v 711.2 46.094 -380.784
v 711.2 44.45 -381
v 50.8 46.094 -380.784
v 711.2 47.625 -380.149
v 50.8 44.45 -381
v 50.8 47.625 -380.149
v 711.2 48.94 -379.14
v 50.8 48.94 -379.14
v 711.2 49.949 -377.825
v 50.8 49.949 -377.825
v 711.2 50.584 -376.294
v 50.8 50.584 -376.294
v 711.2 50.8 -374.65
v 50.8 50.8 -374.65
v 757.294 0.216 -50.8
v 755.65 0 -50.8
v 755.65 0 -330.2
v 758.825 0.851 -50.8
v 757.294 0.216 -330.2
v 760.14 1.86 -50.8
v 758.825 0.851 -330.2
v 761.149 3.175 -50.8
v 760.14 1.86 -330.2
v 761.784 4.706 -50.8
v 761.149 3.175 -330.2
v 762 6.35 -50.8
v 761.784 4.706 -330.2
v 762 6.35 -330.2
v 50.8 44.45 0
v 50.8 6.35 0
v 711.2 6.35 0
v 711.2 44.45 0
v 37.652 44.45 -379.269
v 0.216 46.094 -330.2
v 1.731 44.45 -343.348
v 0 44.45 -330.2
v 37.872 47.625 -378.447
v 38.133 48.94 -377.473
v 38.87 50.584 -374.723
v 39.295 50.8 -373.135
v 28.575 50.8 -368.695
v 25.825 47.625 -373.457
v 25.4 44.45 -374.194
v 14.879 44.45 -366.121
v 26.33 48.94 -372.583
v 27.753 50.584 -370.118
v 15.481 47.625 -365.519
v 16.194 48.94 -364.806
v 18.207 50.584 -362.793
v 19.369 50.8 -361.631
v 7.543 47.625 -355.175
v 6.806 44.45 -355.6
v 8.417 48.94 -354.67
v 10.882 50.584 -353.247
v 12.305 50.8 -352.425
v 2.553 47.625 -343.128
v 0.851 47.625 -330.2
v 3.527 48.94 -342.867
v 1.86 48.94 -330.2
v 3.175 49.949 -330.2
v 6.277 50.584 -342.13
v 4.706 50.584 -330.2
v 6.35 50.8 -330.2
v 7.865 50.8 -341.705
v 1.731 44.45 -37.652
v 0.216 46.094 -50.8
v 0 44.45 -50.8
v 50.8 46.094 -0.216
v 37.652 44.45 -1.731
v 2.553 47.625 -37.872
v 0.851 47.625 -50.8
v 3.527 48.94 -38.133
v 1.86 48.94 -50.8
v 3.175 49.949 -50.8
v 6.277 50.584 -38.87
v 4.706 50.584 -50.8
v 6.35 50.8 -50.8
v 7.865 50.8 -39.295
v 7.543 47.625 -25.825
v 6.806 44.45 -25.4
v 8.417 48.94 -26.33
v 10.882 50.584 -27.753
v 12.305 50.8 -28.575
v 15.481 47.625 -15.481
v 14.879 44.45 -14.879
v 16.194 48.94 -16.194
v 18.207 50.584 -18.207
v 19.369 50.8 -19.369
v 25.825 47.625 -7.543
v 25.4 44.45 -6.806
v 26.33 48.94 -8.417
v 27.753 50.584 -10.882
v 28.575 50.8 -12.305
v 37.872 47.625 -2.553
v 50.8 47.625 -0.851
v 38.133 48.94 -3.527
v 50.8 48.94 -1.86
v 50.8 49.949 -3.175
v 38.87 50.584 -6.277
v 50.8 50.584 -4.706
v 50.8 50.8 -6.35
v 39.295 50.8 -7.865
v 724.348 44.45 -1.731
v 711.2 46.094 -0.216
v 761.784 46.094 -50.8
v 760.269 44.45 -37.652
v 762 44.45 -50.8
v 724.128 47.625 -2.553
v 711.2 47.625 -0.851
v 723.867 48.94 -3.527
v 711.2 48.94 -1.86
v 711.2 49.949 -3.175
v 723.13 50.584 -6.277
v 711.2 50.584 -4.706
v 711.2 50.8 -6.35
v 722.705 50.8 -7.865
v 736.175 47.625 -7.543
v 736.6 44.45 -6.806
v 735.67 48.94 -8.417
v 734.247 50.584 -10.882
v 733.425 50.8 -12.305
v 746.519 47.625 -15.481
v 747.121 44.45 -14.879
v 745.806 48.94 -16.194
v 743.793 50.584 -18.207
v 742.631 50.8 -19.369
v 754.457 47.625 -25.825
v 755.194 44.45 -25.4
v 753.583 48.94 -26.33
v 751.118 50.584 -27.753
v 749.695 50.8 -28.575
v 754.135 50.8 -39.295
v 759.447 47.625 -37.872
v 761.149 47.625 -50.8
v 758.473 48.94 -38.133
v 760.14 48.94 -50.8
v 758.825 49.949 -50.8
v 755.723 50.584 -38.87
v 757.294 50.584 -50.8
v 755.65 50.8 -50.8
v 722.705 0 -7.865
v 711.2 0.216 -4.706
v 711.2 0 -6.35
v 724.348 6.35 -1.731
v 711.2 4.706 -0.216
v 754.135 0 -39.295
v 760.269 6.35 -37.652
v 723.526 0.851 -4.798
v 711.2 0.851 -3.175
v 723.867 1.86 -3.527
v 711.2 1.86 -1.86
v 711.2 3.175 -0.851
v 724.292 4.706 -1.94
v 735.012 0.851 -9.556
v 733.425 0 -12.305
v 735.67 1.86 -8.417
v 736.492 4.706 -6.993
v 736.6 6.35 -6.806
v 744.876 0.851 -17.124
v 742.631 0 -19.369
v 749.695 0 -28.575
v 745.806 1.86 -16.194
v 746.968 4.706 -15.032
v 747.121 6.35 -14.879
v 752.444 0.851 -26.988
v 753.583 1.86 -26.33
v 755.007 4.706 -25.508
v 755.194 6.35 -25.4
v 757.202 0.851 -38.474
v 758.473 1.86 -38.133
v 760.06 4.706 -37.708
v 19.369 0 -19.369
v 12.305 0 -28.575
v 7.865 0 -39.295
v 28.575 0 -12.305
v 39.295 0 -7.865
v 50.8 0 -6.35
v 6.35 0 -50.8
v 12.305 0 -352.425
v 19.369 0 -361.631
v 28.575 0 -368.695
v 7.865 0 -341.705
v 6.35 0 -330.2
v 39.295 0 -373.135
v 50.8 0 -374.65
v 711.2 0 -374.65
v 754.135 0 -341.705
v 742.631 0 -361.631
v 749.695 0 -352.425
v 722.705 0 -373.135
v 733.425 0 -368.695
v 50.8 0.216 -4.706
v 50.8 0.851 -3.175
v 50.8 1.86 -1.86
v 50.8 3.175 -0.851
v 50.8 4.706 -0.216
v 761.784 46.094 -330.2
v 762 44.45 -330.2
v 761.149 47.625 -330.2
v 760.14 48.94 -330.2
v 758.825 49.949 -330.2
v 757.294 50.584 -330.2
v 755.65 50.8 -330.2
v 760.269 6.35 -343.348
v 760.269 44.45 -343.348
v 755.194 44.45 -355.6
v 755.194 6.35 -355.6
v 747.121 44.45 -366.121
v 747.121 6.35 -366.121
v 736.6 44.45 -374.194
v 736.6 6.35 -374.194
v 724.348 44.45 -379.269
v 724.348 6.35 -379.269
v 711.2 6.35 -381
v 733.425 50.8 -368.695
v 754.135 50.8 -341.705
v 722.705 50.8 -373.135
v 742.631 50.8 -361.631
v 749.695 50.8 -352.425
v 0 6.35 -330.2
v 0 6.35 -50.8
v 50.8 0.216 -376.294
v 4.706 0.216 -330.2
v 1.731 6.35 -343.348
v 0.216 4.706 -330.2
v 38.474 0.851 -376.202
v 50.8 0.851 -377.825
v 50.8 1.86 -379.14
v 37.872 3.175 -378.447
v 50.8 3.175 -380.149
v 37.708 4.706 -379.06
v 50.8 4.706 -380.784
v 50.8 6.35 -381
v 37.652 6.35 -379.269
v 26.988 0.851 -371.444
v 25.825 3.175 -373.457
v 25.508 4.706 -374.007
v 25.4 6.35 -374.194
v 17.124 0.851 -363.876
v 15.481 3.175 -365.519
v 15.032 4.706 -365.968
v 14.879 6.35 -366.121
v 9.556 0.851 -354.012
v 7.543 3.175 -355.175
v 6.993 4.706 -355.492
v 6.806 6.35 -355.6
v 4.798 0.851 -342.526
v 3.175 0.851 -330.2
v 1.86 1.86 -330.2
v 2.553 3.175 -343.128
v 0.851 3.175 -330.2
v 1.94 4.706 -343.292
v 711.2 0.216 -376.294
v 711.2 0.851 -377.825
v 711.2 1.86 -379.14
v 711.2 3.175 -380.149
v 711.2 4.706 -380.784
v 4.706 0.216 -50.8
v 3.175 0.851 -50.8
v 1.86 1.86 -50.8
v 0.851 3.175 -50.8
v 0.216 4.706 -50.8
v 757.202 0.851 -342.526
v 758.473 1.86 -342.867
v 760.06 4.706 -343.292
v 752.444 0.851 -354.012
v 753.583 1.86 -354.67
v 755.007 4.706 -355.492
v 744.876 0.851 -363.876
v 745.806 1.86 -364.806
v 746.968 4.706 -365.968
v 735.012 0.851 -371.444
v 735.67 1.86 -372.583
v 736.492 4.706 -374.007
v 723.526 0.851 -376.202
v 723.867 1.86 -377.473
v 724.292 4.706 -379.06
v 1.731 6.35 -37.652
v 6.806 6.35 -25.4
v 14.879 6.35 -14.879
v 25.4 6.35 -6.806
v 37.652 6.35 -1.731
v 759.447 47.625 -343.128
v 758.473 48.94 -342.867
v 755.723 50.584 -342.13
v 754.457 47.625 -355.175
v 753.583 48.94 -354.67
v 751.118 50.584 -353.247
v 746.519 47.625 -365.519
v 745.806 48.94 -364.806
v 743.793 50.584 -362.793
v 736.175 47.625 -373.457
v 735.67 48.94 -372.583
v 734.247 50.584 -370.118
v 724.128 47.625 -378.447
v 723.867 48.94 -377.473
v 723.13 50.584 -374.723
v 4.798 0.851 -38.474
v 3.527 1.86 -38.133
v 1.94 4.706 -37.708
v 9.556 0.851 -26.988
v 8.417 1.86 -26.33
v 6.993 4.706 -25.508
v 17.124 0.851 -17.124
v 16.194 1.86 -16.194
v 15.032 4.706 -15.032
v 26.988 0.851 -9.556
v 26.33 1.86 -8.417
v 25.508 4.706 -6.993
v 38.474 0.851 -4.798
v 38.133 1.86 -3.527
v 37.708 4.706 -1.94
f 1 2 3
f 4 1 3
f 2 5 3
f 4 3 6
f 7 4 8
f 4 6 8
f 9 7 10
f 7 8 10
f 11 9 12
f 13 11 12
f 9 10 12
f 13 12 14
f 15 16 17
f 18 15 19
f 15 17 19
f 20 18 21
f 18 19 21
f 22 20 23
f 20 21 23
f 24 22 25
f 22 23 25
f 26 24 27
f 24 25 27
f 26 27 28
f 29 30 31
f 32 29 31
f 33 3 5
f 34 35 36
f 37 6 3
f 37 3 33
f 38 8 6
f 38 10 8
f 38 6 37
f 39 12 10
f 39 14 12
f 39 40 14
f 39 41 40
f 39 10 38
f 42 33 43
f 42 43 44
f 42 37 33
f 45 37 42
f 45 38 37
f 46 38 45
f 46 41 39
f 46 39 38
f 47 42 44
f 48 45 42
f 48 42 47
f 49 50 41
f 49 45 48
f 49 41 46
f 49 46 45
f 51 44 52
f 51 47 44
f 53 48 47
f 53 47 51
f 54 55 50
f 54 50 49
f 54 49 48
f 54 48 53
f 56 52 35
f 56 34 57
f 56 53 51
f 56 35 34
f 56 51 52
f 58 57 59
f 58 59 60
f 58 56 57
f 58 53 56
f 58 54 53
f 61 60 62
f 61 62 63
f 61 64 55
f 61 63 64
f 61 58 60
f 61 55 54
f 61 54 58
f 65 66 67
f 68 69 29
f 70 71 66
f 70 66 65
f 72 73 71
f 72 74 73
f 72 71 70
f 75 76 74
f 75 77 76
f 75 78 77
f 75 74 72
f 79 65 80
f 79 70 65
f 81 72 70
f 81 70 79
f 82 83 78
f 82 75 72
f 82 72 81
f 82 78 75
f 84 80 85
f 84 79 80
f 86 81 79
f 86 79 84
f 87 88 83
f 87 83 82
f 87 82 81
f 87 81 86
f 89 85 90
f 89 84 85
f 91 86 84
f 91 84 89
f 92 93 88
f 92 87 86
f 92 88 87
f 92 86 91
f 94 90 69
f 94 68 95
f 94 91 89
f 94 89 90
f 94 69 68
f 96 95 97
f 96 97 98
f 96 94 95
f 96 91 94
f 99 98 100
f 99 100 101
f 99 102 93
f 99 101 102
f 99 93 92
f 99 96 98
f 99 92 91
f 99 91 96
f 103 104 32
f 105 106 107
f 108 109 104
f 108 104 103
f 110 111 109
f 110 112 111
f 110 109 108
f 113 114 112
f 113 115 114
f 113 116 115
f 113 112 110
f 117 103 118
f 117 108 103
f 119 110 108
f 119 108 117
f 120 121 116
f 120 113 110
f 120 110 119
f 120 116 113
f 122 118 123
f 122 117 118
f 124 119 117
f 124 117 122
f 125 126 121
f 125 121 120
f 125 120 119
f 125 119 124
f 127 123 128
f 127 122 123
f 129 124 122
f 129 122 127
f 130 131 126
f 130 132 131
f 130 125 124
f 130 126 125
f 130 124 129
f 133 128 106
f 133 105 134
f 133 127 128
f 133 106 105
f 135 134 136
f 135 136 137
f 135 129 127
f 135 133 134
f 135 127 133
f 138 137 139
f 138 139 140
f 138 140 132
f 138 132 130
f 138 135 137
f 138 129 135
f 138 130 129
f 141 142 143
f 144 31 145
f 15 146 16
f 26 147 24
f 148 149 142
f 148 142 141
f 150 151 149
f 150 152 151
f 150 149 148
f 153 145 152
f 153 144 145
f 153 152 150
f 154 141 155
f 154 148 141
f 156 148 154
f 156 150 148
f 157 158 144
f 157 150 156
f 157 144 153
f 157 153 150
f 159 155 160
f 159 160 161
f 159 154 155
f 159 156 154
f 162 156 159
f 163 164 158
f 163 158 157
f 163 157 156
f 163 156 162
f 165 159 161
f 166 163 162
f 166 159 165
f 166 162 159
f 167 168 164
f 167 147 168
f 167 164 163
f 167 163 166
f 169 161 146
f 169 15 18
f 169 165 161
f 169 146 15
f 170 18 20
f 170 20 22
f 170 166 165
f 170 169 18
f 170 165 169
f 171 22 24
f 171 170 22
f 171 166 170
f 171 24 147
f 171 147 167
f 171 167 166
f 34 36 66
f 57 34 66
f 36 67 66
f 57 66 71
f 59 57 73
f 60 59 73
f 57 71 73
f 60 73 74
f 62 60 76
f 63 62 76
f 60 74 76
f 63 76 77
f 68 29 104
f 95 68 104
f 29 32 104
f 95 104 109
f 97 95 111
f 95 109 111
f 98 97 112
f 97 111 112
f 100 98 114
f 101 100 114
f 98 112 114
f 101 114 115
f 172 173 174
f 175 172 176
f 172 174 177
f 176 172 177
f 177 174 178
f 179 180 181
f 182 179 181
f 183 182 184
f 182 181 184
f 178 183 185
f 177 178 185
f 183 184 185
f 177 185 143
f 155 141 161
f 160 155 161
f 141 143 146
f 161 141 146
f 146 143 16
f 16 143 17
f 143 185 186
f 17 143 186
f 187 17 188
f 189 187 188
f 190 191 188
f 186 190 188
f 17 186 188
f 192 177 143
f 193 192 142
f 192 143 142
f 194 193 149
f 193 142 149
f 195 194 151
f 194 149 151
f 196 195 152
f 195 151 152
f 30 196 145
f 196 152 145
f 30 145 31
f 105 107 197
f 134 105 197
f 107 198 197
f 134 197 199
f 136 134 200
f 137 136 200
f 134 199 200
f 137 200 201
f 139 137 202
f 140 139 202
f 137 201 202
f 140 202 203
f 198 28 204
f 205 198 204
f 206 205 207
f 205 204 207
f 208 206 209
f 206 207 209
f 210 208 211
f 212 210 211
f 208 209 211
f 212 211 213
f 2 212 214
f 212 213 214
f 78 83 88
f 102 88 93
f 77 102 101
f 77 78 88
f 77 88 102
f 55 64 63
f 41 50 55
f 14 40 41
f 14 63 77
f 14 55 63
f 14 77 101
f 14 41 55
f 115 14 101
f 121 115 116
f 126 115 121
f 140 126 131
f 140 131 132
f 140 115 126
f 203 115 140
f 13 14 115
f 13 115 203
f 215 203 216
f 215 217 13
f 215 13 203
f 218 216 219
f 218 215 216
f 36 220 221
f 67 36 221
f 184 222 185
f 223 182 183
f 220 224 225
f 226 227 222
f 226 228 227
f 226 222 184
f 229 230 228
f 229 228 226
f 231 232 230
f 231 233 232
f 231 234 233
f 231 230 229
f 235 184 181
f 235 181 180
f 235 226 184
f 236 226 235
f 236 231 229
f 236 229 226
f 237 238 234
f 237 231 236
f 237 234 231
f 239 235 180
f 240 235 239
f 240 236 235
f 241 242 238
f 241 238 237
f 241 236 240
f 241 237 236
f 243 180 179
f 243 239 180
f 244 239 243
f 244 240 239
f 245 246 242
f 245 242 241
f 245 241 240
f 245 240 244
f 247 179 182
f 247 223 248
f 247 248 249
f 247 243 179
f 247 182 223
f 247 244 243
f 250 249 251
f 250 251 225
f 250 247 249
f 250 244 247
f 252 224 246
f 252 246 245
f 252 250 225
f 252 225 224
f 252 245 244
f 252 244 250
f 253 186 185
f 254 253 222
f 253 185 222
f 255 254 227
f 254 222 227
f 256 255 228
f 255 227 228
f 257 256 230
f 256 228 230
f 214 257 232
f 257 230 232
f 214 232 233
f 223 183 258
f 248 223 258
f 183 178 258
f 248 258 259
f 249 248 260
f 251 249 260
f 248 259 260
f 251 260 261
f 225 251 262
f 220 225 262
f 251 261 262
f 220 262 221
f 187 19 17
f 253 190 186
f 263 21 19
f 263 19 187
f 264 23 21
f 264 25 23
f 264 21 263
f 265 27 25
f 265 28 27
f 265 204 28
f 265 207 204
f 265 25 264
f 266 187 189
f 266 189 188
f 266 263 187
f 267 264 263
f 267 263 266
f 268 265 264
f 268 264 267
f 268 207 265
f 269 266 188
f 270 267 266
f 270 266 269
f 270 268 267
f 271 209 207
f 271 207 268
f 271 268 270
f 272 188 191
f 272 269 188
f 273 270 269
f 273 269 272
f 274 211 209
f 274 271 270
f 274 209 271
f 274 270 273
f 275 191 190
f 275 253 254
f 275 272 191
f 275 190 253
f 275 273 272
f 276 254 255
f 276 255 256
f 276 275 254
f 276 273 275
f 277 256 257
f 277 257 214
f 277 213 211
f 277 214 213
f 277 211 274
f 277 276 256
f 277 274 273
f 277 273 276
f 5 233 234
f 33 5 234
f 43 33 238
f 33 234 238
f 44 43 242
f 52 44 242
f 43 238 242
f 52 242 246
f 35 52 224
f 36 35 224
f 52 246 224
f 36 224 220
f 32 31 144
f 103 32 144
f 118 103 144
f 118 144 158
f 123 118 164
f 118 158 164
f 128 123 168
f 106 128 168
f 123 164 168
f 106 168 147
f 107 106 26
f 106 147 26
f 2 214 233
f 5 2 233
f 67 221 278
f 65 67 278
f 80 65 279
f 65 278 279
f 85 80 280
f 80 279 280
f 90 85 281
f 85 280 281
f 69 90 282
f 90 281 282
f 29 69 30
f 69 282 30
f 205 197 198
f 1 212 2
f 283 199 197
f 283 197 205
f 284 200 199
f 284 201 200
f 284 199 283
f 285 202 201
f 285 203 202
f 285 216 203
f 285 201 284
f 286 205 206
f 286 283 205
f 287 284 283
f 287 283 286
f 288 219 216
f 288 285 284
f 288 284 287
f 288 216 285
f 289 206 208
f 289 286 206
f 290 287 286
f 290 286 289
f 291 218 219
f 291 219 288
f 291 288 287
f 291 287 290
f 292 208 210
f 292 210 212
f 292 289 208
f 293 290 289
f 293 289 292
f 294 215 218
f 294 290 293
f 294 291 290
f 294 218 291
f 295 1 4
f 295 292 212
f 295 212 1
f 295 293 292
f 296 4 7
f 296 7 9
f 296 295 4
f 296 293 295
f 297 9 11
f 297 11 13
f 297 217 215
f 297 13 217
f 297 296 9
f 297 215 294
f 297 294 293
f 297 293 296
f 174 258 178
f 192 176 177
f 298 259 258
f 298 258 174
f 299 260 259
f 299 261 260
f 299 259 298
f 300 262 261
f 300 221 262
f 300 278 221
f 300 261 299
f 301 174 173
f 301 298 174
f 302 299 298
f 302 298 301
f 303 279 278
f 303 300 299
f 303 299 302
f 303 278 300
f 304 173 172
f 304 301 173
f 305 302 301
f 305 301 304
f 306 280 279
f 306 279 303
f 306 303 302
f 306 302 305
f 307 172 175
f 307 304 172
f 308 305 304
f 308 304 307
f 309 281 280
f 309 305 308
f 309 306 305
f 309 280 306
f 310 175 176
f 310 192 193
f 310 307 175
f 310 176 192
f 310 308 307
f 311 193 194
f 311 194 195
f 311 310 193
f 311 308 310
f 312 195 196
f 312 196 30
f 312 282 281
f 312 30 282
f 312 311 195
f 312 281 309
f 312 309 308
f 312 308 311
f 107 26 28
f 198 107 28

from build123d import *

# Parameters (mm, degrees)
BOSS_EXTRUDE1_DEPTH = 50.8
FILLET1_R           = 6.35
FILLET2_R           = 6.35


with BuildPart() as part:
    # Sketch1 → Boss-Extrude1 (new body)
    with BuildSketch(Plane(origin=(0, 0, 0), x_dir=(1, 0, 0), z_dir=(0, 1, 0))):
        with BuildLine():
            Line((50.8, 0), (711.2, 0))
            ThreePointArc((711.2, 0), (747.121024484, 14.878975516), (762, 50.8))
            Line((762, 50.8), (762, 330.2))
            ThreePointArc((762, 330.2), (747.121024484, 366.121024484), (711.2, 381))
            Line((711.2, 381), (50.8, 381))
            ThreePointArc((50.8, 381), (14.878975516, 366.121024484), (0, 330.2))
            Line((0, 330.2), (0, 50.8))
            ThreePointArc((0, 50.8), (14.878975516, 14.878975516), (50.8, 0))
        make_face()
    extrude(amount=BOSS_EXTRUDE1_DEPTH)

    # Fillet1
    fillet1_edges = [part.edges().sort_by_distance(p)[0] for p in [
        (14.878975516, 50.8, -14.878975516),
        (381, 50.8, 0),
        (747.121024484, 50.8, -14.878975516),
        (762, 50.8, -190.5),
        (747.121024484, 50.8, -366.121024484),
        (381, 50.8, -381),
        (14.878975516, 50.8, -366.121024484),
        (0, 50.8, -190.5),
    ]]
    fillet(fillet1_edges, radius=FILLET1_R)

    # Fillet2
    fillet2_edges = [part.edges().sort_by_distance(p)[0] for p in [
        (0, 0, -190.5),
        (14.878975516, 0, -366.121024484),
        (381, 0, -381),
        (747.121024484, 0, -366.121024484),
        (762, 0, -190.5),
        (747.121024484, 0, -14.878975516),
        (381, 0, 0),
        (14.878975516, 0, -14.878975516),
    ]]
    fillet(fillet2_edges, radius=FILLET2_R)


solid = part.part
